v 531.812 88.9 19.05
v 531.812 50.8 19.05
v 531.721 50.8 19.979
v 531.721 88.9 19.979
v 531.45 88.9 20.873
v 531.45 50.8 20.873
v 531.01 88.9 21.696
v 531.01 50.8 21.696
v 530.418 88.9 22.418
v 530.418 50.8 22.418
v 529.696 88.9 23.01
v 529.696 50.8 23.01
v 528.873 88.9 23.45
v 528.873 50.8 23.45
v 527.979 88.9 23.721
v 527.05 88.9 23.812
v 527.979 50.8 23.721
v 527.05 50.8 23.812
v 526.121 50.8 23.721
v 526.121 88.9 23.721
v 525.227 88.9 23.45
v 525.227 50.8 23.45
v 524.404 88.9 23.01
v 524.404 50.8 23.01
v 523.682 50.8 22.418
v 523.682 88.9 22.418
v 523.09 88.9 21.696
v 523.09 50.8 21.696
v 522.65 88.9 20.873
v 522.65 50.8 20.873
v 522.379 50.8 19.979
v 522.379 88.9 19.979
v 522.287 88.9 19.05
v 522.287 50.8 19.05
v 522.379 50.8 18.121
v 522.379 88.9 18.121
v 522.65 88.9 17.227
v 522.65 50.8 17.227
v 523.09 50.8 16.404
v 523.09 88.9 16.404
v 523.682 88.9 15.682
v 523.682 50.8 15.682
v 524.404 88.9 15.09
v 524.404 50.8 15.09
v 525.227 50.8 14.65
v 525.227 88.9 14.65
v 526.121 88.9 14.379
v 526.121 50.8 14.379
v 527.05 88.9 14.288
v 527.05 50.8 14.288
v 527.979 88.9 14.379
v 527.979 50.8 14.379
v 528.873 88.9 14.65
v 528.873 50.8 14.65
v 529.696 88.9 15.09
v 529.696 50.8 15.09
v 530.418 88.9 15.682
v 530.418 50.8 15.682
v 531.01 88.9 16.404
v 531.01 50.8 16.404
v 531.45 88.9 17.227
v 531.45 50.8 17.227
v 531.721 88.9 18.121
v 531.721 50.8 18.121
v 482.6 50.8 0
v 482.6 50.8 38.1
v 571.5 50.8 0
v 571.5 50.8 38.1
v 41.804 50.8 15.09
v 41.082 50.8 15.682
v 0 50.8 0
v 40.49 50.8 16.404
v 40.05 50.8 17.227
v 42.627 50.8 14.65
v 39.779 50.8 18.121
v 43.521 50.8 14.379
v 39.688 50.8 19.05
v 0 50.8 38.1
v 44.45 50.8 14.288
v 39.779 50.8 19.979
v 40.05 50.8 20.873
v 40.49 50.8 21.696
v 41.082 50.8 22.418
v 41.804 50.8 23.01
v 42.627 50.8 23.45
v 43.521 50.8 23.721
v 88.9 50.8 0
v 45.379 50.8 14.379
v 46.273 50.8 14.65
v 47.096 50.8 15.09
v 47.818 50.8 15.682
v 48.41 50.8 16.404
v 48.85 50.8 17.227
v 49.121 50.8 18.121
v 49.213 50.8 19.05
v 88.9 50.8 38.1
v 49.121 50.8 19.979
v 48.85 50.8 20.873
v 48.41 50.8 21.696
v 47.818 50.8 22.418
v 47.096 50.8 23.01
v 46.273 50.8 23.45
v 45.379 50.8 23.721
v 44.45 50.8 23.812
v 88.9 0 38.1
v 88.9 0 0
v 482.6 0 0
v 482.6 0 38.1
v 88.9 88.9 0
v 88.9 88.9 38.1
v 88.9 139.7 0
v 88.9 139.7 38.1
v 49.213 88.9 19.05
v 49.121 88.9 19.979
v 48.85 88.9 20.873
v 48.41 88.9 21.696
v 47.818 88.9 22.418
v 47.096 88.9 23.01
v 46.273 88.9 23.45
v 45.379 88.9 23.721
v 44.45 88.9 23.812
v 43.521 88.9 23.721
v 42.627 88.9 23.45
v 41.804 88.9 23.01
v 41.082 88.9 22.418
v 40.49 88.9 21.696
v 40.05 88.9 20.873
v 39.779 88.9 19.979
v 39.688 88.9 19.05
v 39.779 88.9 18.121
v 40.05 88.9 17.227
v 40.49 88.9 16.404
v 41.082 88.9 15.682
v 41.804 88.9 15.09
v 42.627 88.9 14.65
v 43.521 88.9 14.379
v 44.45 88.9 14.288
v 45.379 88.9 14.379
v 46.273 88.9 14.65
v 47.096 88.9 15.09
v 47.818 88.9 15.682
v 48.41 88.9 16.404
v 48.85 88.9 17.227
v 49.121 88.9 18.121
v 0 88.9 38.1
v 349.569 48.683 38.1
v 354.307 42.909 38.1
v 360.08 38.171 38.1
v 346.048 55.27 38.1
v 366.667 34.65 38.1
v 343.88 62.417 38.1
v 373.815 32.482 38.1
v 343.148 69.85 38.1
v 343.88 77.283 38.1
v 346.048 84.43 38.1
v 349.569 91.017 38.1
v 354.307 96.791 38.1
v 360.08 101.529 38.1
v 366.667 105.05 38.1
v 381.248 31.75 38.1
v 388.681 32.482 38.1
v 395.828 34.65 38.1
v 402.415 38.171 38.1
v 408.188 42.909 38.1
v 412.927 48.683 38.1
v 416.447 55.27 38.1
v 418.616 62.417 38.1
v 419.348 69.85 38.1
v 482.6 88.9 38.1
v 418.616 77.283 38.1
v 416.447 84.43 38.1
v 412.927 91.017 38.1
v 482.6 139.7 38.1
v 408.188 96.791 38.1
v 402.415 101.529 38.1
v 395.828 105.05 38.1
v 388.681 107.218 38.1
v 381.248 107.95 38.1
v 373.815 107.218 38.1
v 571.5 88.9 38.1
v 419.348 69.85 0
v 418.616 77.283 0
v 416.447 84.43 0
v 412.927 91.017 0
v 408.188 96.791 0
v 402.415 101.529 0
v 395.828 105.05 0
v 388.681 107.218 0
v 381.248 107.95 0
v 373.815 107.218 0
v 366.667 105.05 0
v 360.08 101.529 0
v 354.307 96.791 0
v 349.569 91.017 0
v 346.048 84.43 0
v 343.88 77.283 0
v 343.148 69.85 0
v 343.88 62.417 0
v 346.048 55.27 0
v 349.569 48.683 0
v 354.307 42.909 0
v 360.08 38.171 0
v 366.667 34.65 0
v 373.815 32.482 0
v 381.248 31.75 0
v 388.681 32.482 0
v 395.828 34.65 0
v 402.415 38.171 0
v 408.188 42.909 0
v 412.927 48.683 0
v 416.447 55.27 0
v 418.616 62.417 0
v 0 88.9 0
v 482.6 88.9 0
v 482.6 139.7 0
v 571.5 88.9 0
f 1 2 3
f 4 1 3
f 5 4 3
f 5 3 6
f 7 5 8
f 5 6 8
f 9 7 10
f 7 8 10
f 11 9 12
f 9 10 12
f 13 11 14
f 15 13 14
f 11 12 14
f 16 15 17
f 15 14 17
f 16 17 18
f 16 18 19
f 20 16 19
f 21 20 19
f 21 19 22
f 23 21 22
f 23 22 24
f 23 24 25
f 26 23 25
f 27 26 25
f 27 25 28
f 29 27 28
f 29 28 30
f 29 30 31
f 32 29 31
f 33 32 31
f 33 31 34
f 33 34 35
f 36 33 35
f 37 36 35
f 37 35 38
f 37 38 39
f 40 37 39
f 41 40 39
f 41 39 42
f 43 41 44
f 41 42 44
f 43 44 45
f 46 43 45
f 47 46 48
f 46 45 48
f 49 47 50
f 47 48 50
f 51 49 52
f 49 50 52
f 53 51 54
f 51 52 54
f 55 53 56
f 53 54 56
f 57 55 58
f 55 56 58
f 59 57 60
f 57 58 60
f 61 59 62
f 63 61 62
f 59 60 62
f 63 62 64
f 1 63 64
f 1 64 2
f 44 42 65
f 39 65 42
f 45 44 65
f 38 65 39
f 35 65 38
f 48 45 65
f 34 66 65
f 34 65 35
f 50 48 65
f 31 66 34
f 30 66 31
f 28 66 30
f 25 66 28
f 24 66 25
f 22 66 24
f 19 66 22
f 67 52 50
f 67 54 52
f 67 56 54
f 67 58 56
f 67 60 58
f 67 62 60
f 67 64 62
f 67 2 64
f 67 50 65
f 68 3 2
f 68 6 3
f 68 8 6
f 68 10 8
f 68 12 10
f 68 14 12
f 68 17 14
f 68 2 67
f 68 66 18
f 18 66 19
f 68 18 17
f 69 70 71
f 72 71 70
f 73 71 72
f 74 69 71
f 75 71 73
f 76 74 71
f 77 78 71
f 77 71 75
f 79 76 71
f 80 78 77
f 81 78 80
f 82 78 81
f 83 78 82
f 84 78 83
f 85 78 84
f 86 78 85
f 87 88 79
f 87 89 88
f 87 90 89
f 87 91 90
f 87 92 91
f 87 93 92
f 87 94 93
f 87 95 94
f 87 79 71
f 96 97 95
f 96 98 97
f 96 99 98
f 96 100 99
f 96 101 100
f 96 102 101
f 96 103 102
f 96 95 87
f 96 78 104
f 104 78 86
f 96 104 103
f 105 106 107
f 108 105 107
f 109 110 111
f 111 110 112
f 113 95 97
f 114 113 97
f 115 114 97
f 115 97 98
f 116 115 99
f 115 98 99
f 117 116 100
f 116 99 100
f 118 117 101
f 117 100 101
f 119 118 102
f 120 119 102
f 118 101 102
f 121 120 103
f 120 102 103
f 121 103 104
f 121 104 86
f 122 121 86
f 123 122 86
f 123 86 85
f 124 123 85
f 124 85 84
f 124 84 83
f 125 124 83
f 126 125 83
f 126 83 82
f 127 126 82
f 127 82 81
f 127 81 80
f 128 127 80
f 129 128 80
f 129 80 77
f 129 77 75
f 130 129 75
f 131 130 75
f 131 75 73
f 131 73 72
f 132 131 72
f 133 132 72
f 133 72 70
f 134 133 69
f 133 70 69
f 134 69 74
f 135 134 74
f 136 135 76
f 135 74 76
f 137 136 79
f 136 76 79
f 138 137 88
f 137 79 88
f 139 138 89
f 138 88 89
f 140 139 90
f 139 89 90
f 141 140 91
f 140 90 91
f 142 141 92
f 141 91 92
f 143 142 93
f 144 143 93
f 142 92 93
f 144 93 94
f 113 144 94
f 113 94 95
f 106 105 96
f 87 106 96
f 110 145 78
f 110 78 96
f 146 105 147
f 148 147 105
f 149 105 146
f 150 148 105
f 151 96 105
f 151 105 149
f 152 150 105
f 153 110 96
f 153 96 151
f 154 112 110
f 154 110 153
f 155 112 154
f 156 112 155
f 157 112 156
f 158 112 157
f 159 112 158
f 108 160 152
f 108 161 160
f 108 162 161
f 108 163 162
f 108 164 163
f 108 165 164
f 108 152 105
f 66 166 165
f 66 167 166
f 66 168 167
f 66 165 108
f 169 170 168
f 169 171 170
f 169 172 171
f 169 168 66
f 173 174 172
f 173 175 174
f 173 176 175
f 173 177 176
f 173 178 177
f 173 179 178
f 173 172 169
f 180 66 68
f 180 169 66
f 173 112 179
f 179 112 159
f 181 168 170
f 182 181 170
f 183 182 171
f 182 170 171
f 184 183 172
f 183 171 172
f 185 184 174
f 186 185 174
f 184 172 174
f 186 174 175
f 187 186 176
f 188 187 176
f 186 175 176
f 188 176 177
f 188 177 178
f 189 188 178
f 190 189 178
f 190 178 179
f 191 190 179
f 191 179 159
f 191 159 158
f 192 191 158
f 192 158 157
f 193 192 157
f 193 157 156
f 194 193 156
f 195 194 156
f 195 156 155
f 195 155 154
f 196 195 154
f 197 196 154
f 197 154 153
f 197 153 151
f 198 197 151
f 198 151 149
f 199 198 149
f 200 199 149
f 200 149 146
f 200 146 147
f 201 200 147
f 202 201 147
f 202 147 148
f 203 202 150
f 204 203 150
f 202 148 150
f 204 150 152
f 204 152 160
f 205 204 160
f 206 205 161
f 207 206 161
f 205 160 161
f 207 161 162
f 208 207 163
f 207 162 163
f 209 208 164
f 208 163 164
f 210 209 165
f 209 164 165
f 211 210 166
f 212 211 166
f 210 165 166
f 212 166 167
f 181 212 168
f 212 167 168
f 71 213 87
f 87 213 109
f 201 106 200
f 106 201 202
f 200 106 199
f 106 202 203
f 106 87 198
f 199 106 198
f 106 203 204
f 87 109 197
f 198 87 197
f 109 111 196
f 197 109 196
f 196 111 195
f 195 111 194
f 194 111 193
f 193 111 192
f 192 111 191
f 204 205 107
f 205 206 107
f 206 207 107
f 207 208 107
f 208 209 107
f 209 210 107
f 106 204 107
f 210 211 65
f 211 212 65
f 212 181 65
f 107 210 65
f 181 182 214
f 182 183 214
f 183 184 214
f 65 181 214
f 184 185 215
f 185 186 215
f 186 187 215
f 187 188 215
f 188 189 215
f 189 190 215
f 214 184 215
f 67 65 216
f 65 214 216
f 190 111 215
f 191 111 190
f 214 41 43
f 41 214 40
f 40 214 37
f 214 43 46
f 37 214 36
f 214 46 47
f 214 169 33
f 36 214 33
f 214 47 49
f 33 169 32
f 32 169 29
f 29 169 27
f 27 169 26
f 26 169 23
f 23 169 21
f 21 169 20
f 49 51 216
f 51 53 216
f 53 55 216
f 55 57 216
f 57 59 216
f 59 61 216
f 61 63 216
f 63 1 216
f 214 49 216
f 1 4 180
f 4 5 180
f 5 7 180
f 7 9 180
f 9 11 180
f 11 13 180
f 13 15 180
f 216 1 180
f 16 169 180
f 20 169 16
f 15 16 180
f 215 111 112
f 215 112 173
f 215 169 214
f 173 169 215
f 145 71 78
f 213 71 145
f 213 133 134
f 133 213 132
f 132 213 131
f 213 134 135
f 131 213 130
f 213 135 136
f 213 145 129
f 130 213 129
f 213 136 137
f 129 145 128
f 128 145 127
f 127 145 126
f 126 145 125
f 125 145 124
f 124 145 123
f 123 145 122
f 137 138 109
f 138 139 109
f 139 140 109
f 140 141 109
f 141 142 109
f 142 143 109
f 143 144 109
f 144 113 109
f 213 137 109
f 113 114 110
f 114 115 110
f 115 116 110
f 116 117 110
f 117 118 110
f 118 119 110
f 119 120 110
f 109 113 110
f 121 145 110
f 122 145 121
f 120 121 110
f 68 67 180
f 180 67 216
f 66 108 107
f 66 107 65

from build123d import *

# Parameters (mm, degrees)
SKETCH2_W           = 571.5
SKETCH2_H           = 139.7
BOSS_EXTRUDE2_DEPTH = 38.1
SKETCH3_W           = 88.9
SKETCH3_H           = 50.8
CUT_EXTRUDE1_DEPTH  = 590.559114933
SKETCH4_R           = 38.1
CUT_EXTRUDE2_DEPTH  = 590.559114933
SKETCH5_R           = 4.7625
CUT_EXTRUDE3_DEPTH  = 580.626664328
SKETCH6_R           = 4.7625
CUT_EXTRUDE4_DEPTH  = 580.626664328


with BuildPart() as part:
    # Sketch2 → Boss-Extrude2 (new body)
    with BuildSketch(Plane.XY):
        with Locations((285.75, 69.85)):
            Rectangle(SKETCH2_W, SKETCH2_H)
    extrude(amount=BOSS_EXTRUDE2_DEPTH)

    # Sketch3 → Cut-Extrude1 (cut, through all)
    with BuildSketch(Plane.XY.offset(38.1)):
        with Locations((44.45, 114.3)):
            Rectangle(SKETCH3_W, SKETCH3_H)
        with Locations((527.05, 114.3)):
            Rectangle(SKETCH3_W, SKETCH3_H)
        with Locations((527.05, 25.4)):
            Rectangle(SKETCH3_W, SKETCH3_H)
        with Locations((44.45, 25.4)):
            Rectangle(SKETCH3_W, SKETCH3_H)
    extrude(amount=-CUT_EXTRUDE1_DEPTH, mode=Mode.SUBTRACT)

    # Sketch4 → Cut-Extrude2 (cut, through all)
    with BuildSketch(Plane.XY.offset(38.1)):
        with Locations((381.247583626, 69.85)):
            Circle(SKETCH4_R)
    extrude(amount=-CUT_EXTRUDE2_DEPTH, mode=Mode.SUBTRACT)

    # Sketch5 → Cut-Extrude3 (cut, through all)
    with BuildSketch(Plane(origin=(0, 50.8, 0), x_dir=(-1, 0, 0), z_dir=(0, -1, 0))):
        with Locations(Location((-44.45, -19.05, 0), (0, 0, 180))):
            Circle(SKETCH5_R)
    extrude(amount=-CUT_EXTRUDE3_DEPTH, mode=Mode.SUBTRACT)

    # Sketch6 → Cut-Extrude4 (cut, through all)
    with BuildSketch(Plane.XZ.offset(-50.8)):
        with Locations((527.05, 19.05)):
            Circle(SKETCH6_R)
    extrude(amount=-CUT_EXTRUDE4_DEPTH, mode=Mode.SUBTRACT)


solid = part.part
